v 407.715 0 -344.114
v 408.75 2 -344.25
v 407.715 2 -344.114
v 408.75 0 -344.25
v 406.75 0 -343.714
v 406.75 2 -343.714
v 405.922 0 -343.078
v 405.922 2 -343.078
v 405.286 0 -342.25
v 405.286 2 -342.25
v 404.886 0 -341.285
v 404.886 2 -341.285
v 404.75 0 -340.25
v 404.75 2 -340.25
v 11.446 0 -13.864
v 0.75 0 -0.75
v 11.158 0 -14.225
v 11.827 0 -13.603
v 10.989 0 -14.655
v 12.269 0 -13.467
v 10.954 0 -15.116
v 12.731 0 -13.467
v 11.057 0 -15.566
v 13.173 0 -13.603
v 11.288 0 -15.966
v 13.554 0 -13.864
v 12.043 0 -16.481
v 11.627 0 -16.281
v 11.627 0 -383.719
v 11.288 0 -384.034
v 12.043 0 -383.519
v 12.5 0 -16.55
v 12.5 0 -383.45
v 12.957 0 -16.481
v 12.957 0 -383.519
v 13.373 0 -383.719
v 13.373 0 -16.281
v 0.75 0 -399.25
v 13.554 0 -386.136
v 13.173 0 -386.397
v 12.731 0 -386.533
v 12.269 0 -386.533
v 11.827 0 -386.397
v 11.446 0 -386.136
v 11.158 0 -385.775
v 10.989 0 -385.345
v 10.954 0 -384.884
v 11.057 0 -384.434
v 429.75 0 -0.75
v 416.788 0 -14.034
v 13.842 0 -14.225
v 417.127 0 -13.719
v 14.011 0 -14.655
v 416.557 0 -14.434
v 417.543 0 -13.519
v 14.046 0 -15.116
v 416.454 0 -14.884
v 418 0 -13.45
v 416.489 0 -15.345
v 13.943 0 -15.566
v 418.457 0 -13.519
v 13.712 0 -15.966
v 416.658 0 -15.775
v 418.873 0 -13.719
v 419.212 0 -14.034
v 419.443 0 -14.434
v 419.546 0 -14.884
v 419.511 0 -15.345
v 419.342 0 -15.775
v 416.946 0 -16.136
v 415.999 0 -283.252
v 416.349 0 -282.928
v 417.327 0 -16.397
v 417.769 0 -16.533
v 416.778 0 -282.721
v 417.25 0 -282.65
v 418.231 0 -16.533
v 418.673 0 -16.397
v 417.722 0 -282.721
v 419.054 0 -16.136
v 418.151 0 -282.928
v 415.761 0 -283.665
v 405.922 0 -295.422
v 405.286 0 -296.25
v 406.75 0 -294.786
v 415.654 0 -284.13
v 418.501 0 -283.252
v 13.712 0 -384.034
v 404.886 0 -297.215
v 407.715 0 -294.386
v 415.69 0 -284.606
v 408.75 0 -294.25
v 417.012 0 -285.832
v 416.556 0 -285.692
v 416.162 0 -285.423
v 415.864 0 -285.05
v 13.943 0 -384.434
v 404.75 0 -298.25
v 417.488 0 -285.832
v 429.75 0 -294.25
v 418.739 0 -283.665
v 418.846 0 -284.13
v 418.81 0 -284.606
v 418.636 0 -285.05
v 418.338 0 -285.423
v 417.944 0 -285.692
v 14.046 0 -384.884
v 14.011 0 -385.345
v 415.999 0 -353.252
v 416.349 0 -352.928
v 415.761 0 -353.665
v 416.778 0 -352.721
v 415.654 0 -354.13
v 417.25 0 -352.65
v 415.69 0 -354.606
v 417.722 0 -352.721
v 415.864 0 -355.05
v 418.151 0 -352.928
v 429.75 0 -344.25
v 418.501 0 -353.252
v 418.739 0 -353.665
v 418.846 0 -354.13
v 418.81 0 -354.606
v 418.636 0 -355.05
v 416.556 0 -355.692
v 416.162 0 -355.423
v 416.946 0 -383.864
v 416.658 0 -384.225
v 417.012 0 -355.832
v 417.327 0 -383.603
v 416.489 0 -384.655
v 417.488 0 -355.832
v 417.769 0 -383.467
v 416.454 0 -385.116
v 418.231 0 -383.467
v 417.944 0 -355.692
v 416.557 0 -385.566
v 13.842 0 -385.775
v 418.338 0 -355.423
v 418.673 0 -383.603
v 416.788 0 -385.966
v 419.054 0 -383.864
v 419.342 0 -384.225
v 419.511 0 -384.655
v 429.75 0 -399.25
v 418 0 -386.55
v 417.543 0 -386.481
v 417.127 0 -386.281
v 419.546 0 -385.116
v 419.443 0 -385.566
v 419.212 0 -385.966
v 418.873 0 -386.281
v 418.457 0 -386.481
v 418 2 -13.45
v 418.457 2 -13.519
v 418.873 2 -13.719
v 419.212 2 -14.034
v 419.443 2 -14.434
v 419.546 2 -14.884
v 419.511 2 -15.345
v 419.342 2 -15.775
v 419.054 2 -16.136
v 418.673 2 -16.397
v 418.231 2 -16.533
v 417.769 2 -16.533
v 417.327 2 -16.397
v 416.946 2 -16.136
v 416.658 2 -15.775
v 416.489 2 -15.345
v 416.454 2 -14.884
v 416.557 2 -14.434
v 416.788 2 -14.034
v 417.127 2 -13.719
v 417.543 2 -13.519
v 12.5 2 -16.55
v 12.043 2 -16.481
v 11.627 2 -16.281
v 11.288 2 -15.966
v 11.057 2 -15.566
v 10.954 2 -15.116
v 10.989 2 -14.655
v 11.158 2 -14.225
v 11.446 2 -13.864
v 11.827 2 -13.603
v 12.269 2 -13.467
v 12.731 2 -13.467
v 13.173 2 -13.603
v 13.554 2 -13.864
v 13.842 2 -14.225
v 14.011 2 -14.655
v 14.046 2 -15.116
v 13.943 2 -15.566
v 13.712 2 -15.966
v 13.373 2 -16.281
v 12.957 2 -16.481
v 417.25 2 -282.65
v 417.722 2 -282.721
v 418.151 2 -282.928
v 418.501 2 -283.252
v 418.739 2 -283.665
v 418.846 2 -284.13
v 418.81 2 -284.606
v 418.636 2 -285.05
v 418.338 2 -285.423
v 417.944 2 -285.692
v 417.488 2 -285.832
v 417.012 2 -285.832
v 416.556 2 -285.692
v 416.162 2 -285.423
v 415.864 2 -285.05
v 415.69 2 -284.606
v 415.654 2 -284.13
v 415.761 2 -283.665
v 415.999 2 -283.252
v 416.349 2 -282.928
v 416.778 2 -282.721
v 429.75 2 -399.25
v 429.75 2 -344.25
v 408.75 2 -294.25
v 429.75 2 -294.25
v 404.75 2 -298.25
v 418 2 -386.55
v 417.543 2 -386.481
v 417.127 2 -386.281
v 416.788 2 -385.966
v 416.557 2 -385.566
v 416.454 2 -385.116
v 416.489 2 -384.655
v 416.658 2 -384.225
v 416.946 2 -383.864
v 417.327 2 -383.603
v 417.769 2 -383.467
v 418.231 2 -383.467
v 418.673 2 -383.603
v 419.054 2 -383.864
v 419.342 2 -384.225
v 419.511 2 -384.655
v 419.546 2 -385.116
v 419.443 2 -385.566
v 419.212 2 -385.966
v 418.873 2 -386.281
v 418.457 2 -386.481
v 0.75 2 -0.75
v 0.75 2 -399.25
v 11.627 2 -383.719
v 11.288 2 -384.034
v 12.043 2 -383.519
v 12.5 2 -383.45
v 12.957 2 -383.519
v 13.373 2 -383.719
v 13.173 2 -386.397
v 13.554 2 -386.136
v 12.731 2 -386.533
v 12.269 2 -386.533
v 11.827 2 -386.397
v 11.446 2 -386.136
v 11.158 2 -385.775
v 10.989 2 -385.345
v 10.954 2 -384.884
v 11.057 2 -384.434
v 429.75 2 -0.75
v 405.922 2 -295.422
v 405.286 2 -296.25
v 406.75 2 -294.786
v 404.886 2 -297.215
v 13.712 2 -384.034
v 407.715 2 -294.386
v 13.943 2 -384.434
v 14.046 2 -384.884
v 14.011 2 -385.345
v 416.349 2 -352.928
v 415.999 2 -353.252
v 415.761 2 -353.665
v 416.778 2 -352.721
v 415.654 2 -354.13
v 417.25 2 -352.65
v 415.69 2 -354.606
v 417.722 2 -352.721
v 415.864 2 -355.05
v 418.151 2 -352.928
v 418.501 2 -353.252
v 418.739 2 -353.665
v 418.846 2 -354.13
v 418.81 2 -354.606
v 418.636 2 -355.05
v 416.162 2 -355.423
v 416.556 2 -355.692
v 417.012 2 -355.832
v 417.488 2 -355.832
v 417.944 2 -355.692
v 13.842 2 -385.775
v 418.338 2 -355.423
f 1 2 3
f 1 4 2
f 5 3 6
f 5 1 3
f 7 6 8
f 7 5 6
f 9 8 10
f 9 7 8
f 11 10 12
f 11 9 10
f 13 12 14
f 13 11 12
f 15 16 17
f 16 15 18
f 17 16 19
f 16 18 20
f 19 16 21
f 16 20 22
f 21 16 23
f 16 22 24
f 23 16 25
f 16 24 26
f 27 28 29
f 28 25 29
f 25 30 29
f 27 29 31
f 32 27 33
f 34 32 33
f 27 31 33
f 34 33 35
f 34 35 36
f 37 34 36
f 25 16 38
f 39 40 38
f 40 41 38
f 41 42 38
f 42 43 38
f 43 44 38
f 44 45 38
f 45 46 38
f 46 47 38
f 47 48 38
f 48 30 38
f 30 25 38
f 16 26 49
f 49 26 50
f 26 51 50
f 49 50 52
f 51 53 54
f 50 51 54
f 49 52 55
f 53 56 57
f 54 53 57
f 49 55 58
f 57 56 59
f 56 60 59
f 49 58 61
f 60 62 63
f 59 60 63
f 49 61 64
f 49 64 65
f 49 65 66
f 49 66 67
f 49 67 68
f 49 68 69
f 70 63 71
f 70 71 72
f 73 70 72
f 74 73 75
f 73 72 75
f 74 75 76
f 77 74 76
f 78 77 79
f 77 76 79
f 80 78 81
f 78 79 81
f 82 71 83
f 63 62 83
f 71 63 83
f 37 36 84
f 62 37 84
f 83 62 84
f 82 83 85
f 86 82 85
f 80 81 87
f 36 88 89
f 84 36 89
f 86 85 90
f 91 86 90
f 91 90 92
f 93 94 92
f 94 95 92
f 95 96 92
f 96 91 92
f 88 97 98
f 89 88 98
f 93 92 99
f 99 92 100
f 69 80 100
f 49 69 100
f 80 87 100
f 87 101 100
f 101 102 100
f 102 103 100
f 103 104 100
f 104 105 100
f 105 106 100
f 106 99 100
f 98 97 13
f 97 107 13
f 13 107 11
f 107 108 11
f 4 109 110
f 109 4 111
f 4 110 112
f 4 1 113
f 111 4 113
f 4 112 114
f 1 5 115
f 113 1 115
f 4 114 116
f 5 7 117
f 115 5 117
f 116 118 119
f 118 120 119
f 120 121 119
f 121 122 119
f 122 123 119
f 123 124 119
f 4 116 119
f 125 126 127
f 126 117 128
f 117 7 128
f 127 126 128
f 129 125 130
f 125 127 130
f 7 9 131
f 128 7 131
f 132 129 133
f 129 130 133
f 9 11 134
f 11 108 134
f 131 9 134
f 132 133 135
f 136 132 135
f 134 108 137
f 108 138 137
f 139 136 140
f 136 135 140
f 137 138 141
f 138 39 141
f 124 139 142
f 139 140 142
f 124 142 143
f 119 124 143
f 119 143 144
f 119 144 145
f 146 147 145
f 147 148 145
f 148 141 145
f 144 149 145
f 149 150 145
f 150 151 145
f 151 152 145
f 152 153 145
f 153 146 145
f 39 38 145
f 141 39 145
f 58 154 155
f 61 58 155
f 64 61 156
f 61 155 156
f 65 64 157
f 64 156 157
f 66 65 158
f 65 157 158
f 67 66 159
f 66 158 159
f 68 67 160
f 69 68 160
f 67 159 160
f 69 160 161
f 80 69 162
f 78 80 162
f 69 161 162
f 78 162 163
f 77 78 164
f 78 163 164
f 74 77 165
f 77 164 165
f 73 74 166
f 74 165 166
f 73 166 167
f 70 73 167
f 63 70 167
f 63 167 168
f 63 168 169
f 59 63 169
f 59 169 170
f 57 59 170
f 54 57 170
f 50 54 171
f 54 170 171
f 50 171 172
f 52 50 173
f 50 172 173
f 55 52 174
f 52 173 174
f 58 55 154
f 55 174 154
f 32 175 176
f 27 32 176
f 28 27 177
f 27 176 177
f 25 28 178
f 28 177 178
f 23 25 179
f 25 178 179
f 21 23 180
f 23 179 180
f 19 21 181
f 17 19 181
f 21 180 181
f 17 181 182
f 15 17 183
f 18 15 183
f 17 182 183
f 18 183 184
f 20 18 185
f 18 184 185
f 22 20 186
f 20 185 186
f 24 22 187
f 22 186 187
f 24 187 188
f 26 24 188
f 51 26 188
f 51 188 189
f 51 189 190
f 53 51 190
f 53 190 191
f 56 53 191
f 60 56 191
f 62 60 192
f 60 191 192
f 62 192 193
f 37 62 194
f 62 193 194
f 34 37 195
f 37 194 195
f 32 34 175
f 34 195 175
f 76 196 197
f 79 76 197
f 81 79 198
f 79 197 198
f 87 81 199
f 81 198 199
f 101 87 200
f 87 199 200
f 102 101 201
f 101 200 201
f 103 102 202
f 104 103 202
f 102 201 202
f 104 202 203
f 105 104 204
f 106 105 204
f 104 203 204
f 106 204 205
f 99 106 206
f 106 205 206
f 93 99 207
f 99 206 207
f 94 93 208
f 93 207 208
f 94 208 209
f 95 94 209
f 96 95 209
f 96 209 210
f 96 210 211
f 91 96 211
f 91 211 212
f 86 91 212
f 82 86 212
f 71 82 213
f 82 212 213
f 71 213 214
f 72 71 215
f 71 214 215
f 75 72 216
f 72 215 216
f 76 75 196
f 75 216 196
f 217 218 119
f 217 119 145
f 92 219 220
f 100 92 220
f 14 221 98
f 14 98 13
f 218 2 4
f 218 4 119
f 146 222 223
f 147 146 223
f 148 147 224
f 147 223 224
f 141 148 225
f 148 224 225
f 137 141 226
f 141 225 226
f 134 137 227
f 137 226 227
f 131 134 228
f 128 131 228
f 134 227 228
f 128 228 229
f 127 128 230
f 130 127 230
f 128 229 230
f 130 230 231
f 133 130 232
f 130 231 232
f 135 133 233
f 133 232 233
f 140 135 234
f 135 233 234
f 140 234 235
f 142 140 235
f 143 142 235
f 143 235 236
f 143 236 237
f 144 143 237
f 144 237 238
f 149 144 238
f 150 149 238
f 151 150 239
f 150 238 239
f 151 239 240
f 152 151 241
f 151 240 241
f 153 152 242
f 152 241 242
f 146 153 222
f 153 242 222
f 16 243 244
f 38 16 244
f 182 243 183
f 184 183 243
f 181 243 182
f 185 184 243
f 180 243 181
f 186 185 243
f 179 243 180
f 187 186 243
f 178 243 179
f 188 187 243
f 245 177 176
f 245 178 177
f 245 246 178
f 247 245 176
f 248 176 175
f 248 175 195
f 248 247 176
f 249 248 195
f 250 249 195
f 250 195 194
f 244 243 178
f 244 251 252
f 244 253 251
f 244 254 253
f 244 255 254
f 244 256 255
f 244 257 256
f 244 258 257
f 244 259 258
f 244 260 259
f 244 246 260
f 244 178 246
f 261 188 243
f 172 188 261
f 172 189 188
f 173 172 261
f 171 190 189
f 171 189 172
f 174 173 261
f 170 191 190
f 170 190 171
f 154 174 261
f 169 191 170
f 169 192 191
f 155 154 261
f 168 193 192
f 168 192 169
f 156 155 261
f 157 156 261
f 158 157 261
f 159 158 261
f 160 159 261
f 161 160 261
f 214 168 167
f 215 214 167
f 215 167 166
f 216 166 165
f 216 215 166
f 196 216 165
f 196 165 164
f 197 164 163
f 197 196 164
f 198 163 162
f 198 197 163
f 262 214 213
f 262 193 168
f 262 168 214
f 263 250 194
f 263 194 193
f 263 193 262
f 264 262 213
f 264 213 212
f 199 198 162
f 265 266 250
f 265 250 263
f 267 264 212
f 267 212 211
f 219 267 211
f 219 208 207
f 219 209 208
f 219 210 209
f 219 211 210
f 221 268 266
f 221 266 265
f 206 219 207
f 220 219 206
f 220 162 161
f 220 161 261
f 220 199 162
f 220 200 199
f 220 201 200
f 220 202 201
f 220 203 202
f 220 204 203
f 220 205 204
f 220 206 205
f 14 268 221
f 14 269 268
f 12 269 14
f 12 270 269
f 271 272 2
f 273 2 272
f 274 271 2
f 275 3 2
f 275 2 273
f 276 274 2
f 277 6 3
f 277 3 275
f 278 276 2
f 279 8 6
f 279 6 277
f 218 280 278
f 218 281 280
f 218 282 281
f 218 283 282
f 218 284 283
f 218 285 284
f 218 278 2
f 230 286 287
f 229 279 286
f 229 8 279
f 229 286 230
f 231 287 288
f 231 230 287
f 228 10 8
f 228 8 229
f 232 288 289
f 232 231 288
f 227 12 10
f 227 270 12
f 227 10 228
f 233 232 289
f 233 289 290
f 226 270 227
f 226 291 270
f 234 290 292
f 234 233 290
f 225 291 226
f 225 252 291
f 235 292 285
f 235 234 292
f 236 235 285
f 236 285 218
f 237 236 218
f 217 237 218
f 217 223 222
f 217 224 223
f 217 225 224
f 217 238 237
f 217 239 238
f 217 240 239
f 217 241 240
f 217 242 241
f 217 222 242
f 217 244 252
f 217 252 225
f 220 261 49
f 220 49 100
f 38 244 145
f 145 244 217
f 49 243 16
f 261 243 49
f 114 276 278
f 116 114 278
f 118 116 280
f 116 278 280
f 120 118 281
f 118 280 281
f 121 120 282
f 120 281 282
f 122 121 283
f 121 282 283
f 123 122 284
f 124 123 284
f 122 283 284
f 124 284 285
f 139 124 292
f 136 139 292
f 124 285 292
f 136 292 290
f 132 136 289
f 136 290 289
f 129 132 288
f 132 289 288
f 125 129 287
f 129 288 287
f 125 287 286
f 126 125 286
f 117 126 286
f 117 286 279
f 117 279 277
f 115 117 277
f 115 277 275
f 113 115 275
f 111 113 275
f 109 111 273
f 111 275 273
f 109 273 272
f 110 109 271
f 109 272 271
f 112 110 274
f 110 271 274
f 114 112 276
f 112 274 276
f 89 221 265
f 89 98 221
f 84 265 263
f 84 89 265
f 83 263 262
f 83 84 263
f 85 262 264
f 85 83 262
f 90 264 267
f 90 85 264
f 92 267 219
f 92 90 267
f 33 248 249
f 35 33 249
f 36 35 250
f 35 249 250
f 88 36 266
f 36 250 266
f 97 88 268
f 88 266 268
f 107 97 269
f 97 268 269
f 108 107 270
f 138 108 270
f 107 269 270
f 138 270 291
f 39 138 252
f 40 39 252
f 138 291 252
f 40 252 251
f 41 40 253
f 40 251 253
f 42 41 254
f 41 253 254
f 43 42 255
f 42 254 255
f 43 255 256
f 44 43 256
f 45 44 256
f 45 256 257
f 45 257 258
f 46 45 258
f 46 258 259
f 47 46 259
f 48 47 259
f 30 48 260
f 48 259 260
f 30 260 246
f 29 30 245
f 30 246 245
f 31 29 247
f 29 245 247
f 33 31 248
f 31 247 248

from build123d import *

# Parameters (mm, degrees)
CROQUIS1_W              = 430.5
CROQUIS1_H              = 400
SALIENTE_EXTRUIR1_DEPTH = 2
CROQUIS2_R              = 1.55
CORTAR_EXTRUIR1_DEPTH   = 2
CROQUIS3_W              = 430.5
CROQUIS3_H              = 400
CROQUIS3_W_2            = 429
CROQUIS3_H_2            = 398.5
CORTAR_EXTRUIR2_DEPTH   = 2
CROQUIS4_W              = 25
CROQUIS4_H              = 50
CORTAR_EXTRUIR3_DEPTH   = 2
REDONDEO1_R             = 4
CROQUIS5_R              = 1.6
CORTAR_EXTRUIR4_DEPTH   = 2


with BuildPart() as part:
    # Croquis1 → Saliente-Extruir1 (new body)
    with BuildSketch(Plane(origin=(0, 0, 0), x_dir=(1, 0, 0), z_dir=(0, 1, 0))):
        with Locations((215.25, 200)):
            Rectangle(CROQUIS1_W, CROQUIS1_H)
    extrude(amount=SALIENTE_EXTRUIR1_DEPTH)

    # Croquis2 → Cortar-Extruir1 (cut)
    with BuildSketch(Plane(origin=(0, 2, 0), x_dir=(1, 0, 0), z_dir=(0, 1, 0))):
        with Locations(Location((12.5, 385, 0), (0, 0, 270))):
            Circle(CROQUIS2_R)
        with Locations(Location((418, 385, 0), (0, 0, 90))):
            Circle(CROQUIS2_R)
        with Locations(Location((418, 15, 0), (0, 0, 270))):
            Circle(CROQUIS2_R)
        with Locations(Location((12.5, 15, 0), (0, 0, 90))):
            Circle(CROQUIS2_R)
    extrude(amount=-CORTAR_EXTRUIR1_DEPTH, mode=Mode.SUBTRACT)

    # Croquis3 → Cortar-Extruir2 (cut)
    with BuildSketch(Plane(origin=(0, 2, 0), x_dir=(1, 0, 0), z_dir=(0, 1, 0))):
        with Locations((215.25, 200)):
            Rectangle(CROQUIS3_W, CROQUIS3_H)
        with Locations((215.25, 200)):
            Rectangle(CROQUIS3_W_2, CROQUIS3_H_2, mode=Mode.SUBTRACT)
    extrude(amount=-CORTAR_EXTRUIR2_DEPTH, mode=Mode.SUBTRACT)

    # Croquis4 → Cortar-Extruir3 (cut)
    with BuildSketch(Plane(origin=(0, 2, 0), x_dir=(1, 0, 0), z_dir=(0, 1, 0))):
        with Locations((417.25, 319.25)):
            Rectangle(CROQUIS4_W, CROQUIS4_H)
    extrude(amount=-CORTAR_EXTRUIR3_DEPTH, mode=Mode.SUBTRACT)

    # Redondeo1
    redondeo1_edges = [part.edges().sort_by_distance(p)[0] for p in [
        (404.75, 1, -344.25),
        (404.75, 1, -294.25),
    ]]
    fillet(redondeo1_edges, radius=REDONDEO1_R)

    # Croquis5 → Cortar-Extruir4 (cut)
    with BuildSketch(Plane(origin=(0, 2, 0), x_dir=(1, 0, 0), z_dir=(0, 1, 0))):
        with Locations(Location((417.25, 354.25, 0), (0, 0, 270))):
            Circle(CROQUIS5_R)
        with Locations(Location((417.25, 284.25, 0), (0, 0, 270))):
            Circle(CROQUIS5_R)
    extrude(amount=-CORTAR_EXTRUIR4_DEPTH, mode=Mode.SUBTRACT)


solid = part.part
